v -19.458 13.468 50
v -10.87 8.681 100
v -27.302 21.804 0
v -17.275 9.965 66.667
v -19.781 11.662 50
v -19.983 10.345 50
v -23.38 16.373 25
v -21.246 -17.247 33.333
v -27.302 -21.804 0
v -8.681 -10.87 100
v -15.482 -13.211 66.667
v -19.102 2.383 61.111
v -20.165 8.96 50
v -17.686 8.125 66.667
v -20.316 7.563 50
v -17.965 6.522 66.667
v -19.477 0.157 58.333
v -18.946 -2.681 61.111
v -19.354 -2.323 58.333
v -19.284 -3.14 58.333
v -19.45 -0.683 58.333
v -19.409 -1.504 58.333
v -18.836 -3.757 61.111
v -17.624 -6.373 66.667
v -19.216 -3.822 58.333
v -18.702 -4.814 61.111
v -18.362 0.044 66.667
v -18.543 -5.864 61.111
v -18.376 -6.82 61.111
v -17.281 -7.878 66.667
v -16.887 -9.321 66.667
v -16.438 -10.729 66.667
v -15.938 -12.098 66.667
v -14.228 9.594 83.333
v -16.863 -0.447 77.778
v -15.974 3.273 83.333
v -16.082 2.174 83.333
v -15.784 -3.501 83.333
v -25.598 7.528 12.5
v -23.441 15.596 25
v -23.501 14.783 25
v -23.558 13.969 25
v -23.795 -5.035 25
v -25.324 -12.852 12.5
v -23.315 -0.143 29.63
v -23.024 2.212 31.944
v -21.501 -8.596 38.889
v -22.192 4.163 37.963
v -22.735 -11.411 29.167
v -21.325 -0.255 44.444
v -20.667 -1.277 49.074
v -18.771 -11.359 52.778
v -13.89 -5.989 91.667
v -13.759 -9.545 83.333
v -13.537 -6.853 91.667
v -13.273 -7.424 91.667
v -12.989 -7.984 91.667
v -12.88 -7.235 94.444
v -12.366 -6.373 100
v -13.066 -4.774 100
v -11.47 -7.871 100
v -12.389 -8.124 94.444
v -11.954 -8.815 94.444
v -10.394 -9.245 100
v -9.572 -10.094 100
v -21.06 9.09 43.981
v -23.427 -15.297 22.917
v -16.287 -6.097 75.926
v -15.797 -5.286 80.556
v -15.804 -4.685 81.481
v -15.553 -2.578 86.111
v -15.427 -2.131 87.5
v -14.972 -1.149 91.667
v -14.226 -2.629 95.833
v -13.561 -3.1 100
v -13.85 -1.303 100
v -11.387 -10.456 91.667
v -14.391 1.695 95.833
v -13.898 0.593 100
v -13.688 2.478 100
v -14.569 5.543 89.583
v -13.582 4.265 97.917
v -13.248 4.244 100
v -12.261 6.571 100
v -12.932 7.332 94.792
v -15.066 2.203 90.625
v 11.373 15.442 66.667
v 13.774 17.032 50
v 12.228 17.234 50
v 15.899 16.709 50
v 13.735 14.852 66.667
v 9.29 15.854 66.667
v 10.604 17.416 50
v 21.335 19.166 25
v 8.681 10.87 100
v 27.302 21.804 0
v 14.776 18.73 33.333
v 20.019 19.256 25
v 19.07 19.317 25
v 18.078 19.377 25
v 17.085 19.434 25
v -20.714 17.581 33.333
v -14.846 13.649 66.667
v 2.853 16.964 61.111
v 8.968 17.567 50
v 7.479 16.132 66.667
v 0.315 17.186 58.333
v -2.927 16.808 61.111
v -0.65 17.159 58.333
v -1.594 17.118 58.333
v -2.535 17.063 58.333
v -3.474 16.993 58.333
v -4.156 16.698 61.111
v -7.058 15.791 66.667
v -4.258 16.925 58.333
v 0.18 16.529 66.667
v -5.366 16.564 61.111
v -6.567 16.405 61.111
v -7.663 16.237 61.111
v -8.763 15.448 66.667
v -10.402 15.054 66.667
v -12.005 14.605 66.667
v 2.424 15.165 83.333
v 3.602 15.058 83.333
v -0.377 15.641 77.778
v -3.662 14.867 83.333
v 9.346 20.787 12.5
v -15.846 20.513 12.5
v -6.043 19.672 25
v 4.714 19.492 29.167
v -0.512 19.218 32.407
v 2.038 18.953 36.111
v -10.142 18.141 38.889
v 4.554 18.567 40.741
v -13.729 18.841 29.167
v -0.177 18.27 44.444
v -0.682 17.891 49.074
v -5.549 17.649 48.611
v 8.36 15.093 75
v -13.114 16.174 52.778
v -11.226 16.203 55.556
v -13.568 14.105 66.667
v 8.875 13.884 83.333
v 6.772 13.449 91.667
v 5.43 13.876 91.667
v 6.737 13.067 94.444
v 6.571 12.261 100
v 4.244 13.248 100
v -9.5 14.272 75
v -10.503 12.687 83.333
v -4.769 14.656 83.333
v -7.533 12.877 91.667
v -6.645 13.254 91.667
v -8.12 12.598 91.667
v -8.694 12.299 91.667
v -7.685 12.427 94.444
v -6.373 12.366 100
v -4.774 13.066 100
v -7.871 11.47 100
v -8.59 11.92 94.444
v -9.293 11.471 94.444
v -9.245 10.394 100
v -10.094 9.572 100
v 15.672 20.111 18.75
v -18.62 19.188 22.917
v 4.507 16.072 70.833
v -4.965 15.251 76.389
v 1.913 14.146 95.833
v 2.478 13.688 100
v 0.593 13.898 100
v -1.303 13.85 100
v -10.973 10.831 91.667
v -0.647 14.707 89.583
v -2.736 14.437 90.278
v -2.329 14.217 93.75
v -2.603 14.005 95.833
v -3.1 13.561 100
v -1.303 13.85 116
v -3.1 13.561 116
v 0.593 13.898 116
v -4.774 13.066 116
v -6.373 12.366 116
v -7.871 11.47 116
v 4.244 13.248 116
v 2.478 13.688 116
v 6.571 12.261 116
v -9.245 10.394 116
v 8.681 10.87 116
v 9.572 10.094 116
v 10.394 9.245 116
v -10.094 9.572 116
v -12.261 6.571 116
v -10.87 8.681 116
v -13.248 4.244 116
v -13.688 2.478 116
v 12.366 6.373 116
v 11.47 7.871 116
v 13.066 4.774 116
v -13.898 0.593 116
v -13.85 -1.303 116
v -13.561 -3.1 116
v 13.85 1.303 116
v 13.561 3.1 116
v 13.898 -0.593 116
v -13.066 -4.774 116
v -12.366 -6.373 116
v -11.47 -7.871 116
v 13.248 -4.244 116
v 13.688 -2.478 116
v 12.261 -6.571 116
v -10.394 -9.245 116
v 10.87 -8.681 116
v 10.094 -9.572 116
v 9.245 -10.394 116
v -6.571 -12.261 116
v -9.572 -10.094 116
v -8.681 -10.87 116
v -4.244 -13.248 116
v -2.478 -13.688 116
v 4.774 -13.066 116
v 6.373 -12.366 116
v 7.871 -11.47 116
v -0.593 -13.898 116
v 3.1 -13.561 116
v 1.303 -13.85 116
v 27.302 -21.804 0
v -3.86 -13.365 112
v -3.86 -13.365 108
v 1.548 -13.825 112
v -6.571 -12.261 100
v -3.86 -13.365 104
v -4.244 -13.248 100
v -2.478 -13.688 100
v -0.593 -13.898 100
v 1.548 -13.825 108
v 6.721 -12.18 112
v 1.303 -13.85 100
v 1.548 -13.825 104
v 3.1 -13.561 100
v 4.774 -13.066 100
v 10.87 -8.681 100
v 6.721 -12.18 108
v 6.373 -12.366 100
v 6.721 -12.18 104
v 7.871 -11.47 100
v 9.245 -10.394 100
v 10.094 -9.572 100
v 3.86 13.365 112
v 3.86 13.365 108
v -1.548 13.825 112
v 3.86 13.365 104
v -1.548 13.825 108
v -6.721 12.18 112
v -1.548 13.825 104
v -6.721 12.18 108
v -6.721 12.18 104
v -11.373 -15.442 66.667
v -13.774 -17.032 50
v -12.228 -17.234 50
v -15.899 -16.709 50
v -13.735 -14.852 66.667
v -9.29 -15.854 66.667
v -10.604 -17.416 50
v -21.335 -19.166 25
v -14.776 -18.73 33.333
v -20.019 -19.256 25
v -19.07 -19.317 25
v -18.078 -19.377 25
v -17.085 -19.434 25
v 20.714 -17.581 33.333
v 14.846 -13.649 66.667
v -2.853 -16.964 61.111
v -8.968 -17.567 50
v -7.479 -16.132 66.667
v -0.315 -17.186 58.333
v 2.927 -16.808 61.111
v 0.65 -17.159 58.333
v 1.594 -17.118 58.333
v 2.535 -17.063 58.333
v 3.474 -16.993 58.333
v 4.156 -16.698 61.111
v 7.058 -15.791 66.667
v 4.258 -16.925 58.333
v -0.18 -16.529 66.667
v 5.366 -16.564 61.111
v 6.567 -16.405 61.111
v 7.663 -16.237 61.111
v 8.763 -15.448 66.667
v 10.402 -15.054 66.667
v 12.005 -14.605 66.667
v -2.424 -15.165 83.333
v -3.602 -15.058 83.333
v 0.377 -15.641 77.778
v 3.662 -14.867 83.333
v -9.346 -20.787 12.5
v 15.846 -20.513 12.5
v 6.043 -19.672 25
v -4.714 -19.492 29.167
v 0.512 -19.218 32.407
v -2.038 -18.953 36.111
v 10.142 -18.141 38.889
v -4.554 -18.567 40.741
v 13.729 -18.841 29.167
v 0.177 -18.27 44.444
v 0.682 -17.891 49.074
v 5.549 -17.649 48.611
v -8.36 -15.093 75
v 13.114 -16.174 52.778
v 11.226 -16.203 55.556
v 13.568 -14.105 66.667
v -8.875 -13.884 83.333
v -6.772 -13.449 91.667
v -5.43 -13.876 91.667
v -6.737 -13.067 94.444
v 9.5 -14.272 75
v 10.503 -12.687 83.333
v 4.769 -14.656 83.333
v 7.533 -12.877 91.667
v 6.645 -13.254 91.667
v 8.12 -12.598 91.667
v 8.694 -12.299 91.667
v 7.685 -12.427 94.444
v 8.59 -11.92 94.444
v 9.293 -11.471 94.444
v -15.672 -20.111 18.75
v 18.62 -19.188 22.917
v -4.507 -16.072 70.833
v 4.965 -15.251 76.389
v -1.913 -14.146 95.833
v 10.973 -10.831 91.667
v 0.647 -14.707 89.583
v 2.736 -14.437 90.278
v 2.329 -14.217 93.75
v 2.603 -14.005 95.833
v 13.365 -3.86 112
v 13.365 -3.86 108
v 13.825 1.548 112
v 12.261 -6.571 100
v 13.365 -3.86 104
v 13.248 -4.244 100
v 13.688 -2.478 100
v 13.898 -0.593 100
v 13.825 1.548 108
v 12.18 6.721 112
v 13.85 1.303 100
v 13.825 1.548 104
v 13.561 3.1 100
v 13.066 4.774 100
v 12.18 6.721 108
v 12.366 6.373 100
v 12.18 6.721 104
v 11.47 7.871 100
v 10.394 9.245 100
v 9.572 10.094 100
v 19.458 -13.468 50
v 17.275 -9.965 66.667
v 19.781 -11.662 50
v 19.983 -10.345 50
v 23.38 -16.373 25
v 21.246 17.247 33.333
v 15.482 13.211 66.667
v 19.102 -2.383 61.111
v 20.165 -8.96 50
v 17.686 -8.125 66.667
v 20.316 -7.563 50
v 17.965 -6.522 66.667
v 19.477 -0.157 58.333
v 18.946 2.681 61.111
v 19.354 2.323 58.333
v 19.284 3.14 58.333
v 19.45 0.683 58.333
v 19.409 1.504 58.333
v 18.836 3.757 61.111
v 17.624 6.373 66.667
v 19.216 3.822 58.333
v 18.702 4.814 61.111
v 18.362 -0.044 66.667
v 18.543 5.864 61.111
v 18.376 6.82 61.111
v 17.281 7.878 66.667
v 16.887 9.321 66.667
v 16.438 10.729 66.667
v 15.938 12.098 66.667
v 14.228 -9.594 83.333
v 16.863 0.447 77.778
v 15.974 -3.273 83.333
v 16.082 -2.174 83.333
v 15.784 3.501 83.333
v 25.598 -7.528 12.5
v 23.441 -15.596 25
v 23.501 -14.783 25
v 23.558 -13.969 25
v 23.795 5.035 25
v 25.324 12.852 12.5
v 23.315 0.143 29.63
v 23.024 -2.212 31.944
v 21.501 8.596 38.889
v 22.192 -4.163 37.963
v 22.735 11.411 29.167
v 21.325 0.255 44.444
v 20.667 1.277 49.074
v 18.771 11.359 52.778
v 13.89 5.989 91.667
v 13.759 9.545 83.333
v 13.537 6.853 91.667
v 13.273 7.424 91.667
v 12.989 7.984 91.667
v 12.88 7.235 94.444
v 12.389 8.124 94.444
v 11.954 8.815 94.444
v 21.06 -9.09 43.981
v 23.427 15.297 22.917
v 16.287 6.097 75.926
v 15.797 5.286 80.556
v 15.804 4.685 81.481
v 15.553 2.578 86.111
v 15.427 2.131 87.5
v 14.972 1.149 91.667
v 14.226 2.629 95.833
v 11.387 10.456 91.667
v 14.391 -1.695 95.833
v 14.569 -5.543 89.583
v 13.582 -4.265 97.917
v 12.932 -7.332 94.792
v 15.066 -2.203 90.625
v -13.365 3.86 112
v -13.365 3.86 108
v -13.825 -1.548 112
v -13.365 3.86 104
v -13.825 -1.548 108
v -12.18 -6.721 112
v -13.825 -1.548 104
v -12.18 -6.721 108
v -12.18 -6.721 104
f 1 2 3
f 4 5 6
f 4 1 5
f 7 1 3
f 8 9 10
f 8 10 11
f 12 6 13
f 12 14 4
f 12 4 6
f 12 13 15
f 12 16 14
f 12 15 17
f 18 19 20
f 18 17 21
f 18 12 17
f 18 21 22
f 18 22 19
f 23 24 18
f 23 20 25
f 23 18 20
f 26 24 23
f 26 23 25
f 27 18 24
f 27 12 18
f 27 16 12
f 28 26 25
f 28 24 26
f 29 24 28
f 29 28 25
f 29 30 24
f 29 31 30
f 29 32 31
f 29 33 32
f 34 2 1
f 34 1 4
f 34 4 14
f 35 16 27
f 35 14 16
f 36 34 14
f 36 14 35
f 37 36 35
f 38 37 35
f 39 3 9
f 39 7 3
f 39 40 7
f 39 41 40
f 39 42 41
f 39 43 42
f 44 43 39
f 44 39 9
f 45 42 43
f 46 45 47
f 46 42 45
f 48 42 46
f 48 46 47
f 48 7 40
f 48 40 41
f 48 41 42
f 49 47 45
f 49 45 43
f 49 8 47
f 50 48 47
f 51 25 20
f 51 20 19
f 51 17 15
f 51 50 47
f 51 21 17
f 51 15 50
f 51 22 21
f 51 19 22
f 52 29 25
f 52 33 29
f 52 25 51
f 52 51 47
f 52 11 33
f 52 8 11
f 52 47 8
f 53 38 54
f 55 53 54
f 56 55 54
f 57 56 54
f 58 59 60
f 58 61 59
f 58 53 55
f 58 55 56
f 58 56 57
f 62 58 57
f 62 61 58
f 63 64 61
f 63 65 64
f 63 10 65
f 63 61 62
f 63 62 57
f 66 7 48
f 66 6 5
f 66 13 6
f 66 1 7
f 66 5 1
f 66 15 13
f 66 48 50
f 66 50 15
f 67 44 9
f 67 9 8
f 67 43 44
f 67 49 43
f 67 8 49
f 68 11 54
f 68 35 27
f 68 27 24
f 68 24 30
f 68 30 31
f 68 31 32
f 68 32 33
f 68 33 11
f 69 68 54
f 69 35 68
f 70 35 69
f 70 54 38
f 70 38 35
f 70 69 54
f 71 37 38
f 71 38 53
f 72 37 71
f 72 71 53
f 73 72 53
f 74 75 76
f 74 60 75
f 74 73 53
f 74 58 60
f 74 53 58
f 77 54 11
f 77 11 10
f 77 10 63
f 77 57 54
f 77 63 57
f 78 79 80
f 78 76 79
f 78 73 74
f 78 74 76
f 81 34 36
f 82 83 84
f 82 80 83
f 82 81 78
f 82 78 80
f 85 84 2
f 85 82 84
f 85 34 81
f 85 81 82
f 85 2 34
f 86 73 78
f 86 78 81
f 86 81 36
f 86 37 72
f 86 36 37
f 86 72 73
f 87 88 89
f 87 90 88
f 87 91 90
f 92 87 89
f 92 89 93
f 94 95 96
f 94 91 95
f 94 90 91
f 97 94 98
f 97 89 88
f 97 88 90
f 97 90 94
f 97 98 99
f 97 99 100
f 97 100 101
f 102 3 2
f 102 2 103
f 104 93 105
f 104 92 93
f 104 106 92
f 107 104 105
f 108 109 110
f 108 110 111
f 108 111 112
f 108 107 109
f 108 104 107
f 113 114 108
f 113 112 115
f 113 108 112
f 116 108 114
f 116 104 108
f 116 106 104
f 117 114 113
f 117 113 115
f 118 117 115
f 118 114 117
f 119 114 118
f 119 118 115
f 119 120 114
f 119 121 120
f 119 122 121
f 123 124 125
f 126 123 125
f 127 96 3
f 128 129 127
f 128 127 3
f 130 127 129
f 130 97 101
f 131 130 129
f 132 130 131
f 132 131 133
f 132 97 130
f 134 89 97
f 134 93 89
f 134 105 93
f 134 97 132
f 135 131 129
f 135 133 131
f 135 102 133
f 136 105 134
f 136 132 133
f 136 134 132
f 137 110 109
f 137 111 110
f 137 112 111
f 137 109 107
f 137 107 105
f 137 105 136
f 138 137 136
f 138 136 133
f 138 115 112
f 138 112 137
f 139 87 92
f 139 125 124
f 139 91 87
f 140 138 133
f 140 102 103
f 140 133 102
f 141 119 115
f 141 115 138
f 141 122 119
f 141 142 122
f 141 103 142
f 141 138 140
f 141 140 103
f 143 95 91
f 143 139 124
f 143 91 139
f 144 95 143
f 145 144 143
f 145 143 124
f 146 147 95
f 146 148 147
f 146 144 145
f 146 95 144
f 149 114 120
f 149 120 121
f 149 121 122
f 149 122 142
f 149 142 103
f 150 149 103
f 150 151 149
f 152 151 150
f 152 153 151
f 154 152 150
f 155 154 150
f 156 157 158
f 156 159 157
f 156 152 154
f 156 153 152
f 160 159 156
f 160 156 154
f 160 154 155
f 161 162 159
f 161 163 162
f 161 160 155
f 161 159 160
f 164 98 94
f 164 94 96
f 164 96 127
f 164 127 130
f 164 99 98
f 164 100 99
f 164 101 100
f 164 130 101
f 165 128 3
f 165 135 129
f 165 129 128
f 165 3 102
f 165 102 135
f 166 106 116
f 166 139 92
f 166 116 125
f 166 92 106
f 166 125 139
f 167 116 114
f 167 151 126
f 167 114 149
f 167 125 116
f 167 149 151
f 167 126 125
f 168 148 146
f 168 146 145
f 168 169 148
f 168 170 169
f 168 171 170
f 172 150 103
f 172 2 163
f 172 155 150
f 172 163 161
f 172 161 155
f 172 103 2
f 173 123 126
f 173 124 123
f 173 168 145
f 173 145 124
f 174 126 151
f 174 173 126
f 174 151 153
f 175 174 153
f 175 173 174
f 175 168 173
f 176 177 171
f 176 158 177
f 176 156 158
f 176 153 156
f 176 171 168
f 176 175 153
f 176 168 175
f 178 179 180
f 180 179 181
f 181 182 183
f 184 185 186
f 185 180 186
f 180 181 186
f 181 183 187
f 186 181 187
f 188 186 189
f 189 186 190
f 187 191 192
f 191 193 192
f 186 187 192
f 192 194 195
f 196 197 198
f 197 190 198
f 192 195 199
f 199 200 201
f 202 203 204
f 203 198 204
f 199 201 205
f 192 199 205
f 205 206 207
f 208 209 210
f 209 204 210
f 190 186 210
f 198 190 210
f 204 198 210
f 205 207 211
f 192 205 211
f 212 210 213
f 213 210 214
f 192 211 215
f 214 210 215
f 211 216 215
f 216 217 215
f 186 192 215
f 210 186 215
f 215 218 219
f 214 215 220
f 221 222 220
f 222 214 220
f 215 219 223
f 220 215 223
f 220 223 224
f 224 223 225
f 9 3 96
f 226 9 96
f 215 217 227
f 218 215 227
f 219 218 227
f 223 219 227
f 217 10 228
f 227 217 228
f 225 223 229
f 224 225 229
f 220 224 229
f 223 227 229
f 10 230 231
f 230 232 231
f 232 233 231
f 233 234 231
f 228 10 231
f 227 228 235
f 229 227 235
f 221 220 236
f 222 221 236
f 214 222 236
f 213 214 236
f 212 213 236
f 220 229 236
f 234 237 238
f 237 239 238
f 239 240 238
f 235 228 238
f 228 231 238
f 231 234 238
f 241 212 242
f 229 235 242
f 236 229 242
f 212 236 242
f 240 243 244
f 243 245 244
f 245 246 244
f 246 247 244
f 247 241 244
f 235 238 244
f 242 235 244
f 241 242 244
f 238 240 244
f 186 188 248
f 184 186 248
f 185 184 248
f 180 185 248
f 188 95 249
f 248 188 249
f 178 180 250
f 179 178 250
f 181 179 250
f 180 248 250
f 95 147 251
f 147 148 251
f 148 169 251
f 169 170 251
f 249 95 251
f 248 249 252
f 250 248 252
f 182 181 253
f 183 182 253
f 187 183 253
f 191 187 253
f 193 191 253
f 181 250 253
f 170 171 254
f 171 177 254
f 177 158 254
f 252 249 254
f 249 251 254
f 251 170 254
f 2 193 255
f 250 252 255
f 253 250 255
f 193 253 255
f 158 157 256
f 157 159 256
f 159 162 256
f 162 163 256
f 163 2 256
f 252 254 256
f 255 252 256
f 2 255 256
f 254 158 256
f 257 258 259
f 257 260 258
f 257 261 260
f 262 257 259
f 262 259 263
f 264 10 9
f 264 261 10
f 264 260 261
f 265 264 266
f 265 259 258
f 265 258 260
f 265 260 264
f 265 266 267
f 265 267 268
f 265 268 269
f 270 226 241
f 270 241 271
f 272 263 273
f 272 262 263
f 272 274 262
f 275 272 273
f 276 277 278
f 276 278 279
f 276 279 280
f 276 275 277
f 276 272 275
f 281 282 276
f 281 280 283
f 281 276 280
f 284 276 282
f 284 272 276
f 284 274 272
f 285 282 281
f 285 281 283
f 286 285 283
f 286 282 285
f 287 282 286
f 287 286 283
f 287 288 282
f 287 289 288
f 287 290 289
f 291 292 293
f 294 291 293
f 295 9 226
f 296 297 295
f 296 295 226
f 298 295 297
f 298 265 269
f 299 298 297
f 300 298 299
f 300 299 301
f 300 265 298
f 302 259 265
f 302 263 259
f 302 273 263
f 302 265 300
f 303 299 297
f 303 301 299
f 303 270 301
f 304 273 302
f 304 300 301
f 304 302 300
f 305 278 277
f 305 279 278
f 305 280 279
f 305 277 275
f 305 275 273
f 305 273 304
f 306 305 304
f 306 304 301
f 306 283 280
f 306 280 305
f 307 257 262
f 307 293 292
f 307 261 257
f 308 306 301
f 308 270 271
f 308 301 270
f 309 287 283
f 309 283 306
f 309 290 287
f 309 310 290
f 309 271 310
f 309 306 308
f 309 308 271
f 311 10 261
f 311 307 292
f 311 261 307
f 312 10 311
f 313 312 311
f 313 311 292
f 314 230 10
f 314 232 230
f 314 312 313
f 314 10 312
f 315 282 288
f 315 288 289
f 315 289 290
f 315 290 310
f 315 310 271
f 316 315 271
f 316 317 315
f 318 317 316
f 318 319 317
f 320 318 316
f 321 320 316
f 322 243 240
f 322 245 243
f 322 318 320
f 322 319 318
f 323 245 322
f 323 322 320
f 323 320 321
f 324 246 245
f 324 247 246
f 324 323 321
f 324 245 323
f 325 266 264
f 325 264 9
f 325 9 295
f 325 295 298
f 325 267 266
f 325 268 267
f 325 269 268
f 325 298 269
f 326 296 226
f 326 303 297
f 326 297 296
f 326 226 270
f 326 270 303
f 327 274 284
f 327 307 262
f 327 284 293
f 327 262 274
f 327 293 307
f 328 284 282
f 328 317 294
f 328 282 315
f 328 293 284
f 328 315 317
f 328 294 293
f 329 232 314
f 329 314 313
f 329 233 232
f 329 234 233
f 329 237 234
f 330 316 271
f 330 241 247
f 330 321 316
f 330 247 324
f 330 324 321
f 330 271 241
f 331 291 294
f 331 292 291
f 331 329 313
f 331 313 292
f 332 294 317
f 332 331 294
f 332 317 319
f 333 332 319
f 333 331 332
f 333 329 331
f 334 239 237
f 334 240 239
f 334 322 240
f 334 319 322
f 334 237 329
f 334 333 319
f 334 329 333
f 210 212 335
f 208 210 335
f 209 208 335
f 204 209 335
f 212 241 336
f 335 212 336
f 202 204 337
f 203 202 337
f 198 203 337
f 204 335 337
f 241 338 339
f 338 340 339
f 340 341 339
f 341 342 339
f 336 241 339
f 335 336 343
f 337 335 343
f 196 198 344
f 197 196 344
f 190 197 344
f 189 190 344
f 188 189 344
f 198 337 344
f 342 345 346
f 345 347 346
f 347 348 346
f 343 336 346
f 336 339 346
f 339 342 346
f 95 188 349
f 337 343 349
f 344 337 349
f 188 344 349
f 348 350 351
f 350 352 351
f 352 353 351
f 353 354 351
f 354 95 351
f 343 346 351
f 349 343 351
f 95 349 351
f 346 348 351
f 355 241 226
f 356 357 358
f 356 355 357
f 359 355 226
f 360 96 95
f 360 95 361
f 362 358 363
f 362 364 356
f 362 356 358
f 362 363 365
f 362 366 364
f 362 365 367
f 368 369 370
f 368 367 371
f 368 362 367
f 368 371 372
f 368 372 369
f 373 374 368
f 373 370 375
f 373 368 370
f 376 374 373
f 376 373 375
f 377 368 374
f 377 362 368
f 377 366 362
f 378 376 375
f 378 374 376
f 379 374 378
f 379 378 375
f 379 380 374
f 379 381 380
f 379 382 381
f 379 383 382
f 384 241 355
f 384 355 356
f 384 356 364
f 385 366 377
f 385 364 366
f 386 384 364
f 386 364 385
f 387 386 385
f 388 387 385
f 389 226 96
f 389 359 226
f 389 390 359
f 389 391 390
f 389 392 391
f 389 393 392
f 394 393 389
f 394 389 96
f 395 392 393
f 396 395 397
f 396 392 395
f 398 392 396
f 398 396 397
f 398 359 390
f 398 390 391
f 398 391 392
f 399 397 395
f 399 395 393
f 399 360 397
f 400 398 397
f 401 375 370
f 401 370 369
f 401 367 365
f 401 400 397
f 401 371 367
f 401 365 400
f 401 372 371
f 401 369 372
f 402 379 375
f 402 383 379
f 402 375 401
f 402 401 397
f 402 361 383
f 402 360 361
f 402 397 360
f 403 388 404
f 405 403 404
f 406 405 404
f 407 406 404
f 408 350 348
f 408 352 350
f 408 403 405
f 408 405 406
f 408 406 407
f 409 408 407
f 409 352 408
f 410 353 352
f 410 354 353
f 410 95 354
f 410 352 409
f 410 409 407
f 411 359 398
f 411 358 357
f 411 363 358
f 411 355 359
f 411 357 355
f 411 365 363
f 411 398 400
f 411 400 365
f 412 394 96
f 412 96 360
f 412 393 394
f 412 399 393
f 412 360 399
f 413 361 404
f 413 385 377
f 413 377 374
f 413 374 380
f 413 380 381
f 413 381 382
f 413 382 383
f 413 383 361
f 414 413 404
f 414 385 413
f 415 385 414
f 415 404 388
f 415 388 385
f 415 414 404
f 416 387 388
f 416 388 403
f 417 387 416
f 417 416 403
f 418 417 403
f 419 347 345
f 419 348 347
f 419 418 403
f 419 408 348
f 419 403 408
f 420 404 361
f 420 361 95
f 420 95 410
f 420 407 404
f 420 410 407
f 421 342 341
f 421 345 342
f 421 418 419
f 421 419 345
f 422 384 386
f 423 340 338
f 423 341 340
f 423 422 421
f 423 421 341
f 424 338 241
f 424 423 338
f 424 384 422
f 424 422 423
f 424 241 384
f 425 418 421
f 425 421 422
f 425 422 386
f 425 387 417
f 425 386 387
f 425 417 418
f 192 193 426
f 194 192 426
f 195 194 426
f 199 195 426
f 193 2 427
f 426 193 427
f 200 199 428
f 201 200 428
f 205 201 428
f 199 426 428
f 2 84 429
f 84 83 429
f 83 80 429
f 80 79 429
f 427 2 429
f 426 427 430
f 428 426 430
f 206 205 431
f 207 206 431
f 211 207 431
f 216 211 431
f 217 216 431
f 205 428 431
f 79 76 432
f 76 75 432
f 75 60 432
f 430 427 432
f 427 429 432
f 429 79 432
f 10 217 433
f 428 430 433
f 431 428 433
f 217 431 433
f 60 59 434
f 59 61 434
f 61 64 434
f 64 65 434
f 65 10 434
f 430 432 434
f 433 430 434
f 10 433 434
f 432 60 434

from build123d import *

# Parameters (mm, degrees)
F0_W     = 54.6039789915
F0_H     = 43.6073467135
F5_DEPTH = 16


# Not quite as in the source:
# - the arcs of a loft's sections are written as splines that run evenly, so that the points pair up as in the source's solid


with BuildPart() as f4:
    # F0 (on Top) → F4 section 0
    with BuildSketch(Plane.XY):
        Rectangle(F0_W, F0_H)
    # F3 (on offset) → F4 section 1
    with BuildSketch(Plane.XY.offset(100)):
        with BuildLine():
            add(Edge.make_bspline(
                [(10.8703523008, -8.681184603), (12.0067167081, -7.2582588142), (12.8597078303, -5.6099448874), (13.8703752153, -2.1109851988), (14.0276538234, -0.2617161283), (13.6223948312, 3.3576667769), (13.0600166829, 5.1263565389), (11.3005283214, 8.3151444232), (10.1041103917, 9.7339878936), (8.681184603, 10.8703523008)],
                knots=[0, 0, 0, 0, 0.25, 0.25, 0.5, 0.5, 0.75, 0.75, 1, 1, 1, 1], degree=3))
            add(Edge.make_bspline(
                [(8.681184603, 10.8703523008), (7.2582588142, 12.0067167081), (5.6099448874, 12.8597078303), (2.1109851988, 13.8703752153), (0.2617161283, 14.0276538234), (-3.3576667769, 13.6223948312), (-5.1263565389, 13.0600166829), (-8.3151444232, 11.3005283214), (-9.7339878936, 10.1041103917), (-10.8703523008, 8.681184603)],
                knots=[0, 0, 0, 0, 0.25, 0.25, 0.5, 0.5, 0.75, 0.75, 1, 1, 1, 1], degree=3))
            add(Edge.make_bspline(
                [(-10.8703523008, 8.681184603), (-12.0067167081, 7.2582588142), (-12.8597078303, 5.6099448874), (-13.8703752153, 2.1109851988), (-14.0276538234, 0.2617161283), (-13.6223948312, -3.3576667769), (-13.0600166829, -5.1263565389), (-11.3005283214, -8.3151444232), (-10.1041103917, -9.7339878936), (-8.681184603, -10.8703523008)],
                knots=[0, 0, 0, 0, 0.25, 0.25, 0.5, 0.5, 0.75, 0.75, 1, 1, 1, 1], degree=3))
            add(Edge.make_bspline(
                [(-8.681184603, -10.8703523008), (-7.2582588142, -12.0067167081), (-5.6099448874, -12.8597078303), (-2.1109851988, -13.8703752153), (-0.2617161283, -14.0276538234), (3.3576667769, -13.6223948312), (5.1263565389, -13.0600166829), (8.3151444232, -11.3005283214), (9.7339878936, -10.1041103917), (10.8703523008, -8.681184603)],
                knots=[0, 0, 0, 0, 0.25, 0.25, 0.5, 0.5, 0.75, 0.75, 1, 1, 1, 1], degree=3))
        make_face()
    loft(ruled=True)

    # F5 (add): a face of the model
    f5_faces = [f4.faces().sort_by_distance(p)[0] for p in [
        (0, 0, 100),
    ]]
    extrude(f5_faces, amount=F5_DEPTH)


solid = f4.part
